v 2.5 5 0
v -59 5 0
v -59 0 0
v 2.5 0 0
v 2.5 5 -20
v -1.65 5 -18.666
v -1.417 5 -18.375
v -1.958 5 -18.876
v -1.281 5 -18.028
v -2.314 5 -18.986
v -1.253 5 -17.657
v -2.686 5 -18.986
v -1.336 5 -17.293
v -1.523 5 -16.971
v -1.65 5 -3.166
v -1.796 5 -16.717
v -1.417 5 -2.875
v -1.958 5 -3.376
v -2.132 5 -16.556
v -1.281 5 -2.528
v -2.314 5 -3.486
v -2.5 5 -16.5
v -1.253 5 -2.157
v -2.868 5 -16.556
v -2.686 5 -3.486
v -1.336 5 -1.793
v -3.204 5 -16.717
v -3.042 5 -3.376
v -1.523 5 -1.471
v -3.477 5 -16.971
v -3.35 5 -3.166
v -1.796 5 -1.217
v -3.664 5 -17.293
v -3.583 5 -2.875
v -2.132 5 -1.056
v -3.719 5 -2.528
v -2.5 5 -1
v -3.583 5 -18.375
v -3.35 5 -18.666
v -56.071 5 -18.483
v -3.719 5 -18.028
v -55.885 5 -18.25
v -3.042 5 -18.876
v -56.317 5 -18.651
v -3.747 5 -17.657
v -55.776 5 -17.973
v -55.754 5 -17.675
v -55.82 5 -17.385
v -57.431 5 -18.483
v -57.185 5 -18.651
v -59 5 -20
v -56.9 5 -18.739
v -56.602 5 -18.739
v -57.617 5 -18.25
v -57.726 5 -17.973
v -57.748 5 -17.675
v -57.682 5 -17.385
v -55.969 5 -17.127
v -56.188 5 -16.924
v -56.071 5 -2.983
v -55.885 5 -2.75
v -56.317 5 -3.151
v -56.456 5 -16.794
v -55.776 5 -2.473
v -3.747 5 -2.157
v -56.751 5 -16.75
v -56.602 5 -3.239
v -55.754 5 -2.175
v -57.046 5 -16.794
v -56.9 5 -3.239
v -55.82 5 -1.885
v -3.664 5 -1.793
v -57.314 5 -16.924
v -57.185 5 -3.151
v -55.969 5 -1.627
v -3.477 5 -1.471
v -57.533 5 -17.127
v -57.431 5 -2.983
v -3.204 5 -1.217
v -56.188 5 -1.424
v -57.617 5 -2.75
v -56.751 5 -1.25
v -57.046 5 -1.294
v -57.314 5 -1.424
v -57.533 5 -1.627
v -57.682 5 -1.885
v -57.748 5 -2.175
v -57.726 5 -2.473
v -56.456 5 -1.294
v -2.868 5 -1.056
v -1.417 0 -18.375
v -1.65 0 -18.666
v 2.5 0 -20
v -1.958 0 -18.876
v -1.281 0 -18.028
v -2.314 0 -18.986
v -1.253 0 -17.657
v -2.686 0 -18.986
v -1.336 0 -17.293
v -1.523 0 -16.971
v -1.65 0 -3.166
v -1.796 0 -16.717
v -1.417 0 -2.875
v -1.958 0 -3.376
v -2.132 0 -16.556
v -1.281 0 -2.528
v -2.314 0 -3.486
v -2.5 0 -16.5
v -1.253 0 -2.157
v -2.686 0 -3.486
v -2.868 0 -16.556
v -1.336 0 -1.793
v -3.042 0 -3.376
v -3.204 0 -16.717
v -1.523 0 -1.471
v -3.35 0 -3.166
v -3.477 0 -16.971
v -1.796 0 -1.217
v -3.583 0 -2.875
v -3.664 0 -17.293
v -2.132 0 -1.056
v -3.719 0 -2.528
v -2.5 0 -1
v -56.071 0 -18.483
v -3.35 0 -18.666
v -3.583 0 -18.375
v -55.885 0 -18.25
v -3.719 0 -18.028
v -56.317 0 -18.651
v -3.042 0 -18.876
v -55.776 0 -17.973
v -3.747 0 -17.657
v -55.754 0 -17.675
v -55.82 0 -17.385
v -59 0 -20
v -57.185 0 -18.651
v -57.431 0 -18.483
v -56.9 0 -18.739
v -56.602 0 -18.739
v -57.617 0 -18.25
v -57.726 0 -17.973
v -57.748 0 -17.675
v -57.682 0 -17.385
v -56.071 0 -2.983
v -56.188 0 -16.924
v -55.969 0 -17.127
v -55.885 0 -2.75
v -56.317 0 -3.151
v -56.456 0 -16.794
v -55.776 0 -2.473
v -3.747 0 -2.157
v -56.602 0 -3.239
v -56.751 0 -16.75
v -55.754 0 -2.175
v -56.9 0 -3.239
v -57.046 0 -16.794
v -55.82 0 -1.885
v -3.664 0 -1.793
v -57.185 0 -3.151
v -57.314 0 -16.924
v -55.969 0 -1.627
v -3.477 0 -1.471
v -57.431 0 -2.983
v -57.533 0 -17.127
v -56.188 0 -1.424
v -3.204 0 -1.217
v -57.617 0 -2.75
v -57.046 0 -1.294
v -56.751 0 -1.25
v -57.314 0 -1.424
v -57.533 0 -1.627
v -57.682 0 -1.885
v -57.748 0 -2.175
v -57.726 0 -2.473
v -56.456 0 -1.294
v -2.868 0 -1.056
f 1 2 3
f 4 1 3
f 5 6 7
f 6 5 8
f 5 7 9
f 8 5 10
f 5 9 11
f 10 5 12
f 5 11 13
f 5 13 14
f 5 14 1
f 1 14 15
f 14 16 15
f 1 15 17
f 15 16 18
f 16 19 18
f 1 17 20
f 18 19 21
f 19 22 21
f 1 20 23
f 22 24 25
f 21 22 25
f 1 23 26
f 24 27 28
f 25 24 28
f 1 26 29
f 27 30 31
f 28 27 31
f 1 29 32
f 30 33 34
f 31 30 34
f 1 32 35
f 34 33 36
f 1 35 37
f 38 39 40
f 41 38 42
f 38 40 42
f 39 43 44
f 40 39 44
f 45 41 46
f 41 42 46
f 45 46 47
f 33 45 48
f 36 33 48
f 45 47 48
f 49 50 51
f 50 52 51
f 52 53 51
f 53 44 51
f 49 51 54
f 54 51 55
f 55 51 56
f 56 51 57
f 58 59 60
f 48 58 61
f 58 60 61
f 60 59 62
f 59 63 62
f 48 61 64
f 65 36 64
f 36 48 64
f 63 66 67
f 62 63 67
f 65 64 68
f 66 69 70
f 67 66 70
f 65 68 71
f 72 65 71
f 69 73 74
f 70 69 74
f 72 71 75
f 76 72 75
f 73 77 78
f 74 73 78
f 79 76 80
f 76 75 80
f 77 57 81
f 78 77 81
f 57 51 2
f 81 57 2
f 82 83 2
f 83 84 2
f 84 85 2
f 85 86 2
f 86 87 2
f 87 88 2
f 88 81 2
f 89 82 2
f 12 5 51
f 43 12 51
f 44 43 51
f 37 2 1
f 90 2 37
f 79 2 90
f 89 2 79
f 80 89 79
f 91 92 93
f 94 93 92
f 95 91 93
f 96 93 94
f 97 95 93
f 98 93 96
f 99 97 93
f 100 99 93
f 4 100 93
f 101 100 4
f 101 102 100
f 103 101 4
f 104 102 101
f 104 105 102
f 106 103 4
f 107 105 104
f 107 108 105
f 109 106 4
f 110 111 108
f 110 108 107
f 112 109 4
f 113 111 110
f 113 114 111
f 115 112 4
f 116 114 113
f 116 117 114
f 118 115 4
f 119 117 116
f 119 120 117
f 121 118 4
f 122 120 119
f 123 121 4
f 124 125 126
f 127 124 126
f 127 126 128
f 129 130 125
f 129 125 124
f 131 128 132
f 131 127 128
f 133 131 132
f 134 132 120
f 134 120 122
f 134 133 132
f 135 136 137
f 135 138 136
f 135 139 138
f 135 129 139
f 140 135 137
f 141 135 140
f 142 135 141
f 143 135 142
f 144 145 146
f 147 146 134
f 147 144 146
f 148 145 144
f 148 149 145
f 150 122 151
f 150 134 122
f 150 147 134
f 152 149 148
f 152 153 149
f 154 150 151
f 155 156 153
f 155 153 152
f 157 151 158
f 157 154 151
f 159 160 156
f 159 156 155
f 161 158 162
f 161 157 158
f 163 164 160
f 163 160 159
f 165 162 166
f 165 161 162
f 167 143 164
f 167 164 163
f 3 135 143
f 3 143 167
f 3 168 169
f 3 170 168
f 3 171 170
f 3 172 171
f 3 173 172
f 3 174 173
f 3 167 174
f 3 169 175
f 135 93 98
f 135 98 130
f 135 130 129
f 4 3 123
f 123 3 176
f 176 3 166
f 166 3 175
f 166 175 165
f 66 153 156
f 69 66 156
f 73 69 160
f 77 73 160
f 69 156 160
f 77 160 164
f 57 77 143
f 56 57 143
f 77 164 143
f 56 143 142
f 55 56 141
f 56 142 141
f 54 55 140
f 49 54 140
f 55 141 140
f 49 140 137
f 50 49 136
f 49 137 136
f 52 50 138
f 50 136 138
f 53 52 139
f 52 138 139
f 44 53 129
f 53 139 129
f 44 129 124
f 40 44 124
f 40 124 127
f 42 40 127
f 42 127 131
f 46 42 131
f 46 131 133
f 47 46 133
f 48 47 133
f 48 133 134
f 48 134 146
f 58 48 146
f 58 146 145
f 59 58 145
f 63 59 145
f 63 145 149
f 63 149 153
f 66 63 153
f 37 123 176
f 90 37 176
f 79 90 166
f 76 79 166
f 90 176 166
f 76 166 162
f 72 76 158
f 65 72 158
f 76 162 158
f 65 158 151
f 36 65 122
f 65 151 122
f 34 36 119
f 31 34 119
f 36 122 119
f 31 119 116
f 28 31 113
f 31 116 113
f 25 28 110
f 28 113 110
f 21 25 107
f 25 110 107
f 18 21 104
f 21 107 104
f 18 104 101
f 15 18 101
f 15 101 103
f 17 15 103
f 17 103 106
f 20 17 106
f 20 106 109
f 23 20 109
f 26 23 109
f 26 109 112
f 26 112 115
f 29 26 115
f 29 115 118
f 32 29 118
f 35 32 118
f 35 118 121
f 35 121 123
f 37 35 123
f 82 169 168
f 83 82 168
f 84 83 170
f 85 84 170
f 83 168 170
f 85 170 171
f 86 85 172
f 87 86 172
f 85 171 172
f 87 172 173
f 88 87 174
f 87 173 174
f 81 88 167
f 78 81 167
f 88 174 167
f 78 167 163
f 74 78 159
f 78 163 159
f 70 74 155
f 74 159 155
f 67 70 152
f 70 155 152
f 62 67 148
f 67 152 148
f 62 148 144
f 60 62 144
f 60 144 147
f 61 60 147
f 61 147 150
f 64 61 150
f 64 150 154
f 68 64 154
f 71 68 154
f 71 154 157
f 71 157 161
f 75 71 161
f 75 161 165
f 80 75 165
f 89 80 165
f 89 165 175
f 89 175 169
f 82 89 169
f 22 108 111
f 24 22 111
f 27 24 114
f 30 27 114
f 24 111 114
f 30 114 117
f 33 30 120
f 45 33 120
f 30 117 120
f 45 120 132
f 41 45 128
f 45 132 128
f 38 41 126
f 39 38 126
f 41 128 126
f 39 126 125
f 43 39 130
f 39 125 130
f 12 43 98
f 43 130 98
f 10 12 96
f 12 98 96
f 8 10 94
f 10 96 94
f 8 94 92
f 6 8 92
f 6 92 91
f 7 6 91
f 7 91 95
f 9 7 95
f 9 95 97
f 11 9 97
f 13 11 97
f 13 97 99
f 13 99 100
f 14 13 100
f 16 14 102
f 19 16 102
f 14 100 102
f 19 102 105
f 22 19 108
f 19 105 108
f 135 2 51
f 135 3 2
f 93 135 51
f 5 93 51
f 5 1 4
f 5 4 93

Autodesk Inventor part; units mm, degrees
ref_plane "YZ Plane" through (0, 0, 0) normal (1, 0, 0) x (0, 1, 0)
ref_plane "XZ Plane" through (0, 0, 0) normal (0, 1, 0) x (-1, 0, 0)
ref_plane "XY Plane" through (0, 0, 0) normal (0, 0, 1) x (1, 0, 0)
sketch "Skizze1" plane through (0, 0, 0) normal (0, 1, 0) x (-1, 0, 0)
  line L0 (0, 0) -> (59, 0)
  line L1 (59, 0) -> (59, -20)
  line L2 (59, -20) -> (0, -20)
  line L3 (0, -20) -> (0, 0)
  dimension "d0" = 59
  dimension "d1" = 20
extrude "Extrusion1" add sketch "Skizze1" along normal blind 5
sketch "Skizze2" plane through (0, 5, 0) normal (0, 1, 0) x (1, 0, 0)
  point P0 (0, 0)
sketch "Skizze3" plane through (0, 5, 0) normal (0, 1, 0) x (1, 0, 0)
  line L0 (0, 0) -> (0, 20) projected
  line L1 (0, 0) -> (-2.5, 0)
  line L2 (-59, 0) -> (0, 0) projected
  line L3 (-2.5, 0) -> (-2.5, 2.25)
  line L4 (-2.5, 2.25) -> (-2.5, 17.75)
  dimension "d4" = 2.5
  dimension "d5" = 2.25
  dimension "d6" = 15.5
hole "Bohrung1" at (-2.5, 5, -2.25) at (-2.5, 5, -17.75) direction (0, -1, 0) diameter 2.5 end through all
sketch "Skizze4" plane through (0, 5, 0) normal (0, 1, 0) x (1, 0, 0)
  line L0 (-59, 0) -> (0, 0) projected
  line L1 (-58.751, 0) -> (-56.751, 0)
  line L2 (-56.751, 0) -> (-59.001, 0)
  line L3 (-56.751, 0) -> (-56.751, 2.25)
  line L4 (-56.751, 2.25) -> (-56.751, 17.75)
  dimension "d14" = 2
  dimension "d16" = 2.25
  dimension "d17" = 15.5
hole "Bohrung2" at (-56.751, 5, -2.25) at (-56.751, 5, -17.75) direction (0, -1, 0) diameter 2 end through all
sketch "Skizze5" plane through (0, 0, 0) normal (1, 0, 0) x (0, 0, -1)
  line L0 (20, 0) -> (0, 0) projected
  line L1 (0, 0) -> (20, 0)
  line L2 (20, 0) -> (20, 5)
  line L3 (20, 5) -> (0, 5)
  line L4 (0, 5) -> (0, 0)
extrude "Extrusion2" add sketch "Skizze5" along normal blind 2.5
properties part number "Sensor_Halterung_Teil2ipt" material "Holz (Eiche)"
